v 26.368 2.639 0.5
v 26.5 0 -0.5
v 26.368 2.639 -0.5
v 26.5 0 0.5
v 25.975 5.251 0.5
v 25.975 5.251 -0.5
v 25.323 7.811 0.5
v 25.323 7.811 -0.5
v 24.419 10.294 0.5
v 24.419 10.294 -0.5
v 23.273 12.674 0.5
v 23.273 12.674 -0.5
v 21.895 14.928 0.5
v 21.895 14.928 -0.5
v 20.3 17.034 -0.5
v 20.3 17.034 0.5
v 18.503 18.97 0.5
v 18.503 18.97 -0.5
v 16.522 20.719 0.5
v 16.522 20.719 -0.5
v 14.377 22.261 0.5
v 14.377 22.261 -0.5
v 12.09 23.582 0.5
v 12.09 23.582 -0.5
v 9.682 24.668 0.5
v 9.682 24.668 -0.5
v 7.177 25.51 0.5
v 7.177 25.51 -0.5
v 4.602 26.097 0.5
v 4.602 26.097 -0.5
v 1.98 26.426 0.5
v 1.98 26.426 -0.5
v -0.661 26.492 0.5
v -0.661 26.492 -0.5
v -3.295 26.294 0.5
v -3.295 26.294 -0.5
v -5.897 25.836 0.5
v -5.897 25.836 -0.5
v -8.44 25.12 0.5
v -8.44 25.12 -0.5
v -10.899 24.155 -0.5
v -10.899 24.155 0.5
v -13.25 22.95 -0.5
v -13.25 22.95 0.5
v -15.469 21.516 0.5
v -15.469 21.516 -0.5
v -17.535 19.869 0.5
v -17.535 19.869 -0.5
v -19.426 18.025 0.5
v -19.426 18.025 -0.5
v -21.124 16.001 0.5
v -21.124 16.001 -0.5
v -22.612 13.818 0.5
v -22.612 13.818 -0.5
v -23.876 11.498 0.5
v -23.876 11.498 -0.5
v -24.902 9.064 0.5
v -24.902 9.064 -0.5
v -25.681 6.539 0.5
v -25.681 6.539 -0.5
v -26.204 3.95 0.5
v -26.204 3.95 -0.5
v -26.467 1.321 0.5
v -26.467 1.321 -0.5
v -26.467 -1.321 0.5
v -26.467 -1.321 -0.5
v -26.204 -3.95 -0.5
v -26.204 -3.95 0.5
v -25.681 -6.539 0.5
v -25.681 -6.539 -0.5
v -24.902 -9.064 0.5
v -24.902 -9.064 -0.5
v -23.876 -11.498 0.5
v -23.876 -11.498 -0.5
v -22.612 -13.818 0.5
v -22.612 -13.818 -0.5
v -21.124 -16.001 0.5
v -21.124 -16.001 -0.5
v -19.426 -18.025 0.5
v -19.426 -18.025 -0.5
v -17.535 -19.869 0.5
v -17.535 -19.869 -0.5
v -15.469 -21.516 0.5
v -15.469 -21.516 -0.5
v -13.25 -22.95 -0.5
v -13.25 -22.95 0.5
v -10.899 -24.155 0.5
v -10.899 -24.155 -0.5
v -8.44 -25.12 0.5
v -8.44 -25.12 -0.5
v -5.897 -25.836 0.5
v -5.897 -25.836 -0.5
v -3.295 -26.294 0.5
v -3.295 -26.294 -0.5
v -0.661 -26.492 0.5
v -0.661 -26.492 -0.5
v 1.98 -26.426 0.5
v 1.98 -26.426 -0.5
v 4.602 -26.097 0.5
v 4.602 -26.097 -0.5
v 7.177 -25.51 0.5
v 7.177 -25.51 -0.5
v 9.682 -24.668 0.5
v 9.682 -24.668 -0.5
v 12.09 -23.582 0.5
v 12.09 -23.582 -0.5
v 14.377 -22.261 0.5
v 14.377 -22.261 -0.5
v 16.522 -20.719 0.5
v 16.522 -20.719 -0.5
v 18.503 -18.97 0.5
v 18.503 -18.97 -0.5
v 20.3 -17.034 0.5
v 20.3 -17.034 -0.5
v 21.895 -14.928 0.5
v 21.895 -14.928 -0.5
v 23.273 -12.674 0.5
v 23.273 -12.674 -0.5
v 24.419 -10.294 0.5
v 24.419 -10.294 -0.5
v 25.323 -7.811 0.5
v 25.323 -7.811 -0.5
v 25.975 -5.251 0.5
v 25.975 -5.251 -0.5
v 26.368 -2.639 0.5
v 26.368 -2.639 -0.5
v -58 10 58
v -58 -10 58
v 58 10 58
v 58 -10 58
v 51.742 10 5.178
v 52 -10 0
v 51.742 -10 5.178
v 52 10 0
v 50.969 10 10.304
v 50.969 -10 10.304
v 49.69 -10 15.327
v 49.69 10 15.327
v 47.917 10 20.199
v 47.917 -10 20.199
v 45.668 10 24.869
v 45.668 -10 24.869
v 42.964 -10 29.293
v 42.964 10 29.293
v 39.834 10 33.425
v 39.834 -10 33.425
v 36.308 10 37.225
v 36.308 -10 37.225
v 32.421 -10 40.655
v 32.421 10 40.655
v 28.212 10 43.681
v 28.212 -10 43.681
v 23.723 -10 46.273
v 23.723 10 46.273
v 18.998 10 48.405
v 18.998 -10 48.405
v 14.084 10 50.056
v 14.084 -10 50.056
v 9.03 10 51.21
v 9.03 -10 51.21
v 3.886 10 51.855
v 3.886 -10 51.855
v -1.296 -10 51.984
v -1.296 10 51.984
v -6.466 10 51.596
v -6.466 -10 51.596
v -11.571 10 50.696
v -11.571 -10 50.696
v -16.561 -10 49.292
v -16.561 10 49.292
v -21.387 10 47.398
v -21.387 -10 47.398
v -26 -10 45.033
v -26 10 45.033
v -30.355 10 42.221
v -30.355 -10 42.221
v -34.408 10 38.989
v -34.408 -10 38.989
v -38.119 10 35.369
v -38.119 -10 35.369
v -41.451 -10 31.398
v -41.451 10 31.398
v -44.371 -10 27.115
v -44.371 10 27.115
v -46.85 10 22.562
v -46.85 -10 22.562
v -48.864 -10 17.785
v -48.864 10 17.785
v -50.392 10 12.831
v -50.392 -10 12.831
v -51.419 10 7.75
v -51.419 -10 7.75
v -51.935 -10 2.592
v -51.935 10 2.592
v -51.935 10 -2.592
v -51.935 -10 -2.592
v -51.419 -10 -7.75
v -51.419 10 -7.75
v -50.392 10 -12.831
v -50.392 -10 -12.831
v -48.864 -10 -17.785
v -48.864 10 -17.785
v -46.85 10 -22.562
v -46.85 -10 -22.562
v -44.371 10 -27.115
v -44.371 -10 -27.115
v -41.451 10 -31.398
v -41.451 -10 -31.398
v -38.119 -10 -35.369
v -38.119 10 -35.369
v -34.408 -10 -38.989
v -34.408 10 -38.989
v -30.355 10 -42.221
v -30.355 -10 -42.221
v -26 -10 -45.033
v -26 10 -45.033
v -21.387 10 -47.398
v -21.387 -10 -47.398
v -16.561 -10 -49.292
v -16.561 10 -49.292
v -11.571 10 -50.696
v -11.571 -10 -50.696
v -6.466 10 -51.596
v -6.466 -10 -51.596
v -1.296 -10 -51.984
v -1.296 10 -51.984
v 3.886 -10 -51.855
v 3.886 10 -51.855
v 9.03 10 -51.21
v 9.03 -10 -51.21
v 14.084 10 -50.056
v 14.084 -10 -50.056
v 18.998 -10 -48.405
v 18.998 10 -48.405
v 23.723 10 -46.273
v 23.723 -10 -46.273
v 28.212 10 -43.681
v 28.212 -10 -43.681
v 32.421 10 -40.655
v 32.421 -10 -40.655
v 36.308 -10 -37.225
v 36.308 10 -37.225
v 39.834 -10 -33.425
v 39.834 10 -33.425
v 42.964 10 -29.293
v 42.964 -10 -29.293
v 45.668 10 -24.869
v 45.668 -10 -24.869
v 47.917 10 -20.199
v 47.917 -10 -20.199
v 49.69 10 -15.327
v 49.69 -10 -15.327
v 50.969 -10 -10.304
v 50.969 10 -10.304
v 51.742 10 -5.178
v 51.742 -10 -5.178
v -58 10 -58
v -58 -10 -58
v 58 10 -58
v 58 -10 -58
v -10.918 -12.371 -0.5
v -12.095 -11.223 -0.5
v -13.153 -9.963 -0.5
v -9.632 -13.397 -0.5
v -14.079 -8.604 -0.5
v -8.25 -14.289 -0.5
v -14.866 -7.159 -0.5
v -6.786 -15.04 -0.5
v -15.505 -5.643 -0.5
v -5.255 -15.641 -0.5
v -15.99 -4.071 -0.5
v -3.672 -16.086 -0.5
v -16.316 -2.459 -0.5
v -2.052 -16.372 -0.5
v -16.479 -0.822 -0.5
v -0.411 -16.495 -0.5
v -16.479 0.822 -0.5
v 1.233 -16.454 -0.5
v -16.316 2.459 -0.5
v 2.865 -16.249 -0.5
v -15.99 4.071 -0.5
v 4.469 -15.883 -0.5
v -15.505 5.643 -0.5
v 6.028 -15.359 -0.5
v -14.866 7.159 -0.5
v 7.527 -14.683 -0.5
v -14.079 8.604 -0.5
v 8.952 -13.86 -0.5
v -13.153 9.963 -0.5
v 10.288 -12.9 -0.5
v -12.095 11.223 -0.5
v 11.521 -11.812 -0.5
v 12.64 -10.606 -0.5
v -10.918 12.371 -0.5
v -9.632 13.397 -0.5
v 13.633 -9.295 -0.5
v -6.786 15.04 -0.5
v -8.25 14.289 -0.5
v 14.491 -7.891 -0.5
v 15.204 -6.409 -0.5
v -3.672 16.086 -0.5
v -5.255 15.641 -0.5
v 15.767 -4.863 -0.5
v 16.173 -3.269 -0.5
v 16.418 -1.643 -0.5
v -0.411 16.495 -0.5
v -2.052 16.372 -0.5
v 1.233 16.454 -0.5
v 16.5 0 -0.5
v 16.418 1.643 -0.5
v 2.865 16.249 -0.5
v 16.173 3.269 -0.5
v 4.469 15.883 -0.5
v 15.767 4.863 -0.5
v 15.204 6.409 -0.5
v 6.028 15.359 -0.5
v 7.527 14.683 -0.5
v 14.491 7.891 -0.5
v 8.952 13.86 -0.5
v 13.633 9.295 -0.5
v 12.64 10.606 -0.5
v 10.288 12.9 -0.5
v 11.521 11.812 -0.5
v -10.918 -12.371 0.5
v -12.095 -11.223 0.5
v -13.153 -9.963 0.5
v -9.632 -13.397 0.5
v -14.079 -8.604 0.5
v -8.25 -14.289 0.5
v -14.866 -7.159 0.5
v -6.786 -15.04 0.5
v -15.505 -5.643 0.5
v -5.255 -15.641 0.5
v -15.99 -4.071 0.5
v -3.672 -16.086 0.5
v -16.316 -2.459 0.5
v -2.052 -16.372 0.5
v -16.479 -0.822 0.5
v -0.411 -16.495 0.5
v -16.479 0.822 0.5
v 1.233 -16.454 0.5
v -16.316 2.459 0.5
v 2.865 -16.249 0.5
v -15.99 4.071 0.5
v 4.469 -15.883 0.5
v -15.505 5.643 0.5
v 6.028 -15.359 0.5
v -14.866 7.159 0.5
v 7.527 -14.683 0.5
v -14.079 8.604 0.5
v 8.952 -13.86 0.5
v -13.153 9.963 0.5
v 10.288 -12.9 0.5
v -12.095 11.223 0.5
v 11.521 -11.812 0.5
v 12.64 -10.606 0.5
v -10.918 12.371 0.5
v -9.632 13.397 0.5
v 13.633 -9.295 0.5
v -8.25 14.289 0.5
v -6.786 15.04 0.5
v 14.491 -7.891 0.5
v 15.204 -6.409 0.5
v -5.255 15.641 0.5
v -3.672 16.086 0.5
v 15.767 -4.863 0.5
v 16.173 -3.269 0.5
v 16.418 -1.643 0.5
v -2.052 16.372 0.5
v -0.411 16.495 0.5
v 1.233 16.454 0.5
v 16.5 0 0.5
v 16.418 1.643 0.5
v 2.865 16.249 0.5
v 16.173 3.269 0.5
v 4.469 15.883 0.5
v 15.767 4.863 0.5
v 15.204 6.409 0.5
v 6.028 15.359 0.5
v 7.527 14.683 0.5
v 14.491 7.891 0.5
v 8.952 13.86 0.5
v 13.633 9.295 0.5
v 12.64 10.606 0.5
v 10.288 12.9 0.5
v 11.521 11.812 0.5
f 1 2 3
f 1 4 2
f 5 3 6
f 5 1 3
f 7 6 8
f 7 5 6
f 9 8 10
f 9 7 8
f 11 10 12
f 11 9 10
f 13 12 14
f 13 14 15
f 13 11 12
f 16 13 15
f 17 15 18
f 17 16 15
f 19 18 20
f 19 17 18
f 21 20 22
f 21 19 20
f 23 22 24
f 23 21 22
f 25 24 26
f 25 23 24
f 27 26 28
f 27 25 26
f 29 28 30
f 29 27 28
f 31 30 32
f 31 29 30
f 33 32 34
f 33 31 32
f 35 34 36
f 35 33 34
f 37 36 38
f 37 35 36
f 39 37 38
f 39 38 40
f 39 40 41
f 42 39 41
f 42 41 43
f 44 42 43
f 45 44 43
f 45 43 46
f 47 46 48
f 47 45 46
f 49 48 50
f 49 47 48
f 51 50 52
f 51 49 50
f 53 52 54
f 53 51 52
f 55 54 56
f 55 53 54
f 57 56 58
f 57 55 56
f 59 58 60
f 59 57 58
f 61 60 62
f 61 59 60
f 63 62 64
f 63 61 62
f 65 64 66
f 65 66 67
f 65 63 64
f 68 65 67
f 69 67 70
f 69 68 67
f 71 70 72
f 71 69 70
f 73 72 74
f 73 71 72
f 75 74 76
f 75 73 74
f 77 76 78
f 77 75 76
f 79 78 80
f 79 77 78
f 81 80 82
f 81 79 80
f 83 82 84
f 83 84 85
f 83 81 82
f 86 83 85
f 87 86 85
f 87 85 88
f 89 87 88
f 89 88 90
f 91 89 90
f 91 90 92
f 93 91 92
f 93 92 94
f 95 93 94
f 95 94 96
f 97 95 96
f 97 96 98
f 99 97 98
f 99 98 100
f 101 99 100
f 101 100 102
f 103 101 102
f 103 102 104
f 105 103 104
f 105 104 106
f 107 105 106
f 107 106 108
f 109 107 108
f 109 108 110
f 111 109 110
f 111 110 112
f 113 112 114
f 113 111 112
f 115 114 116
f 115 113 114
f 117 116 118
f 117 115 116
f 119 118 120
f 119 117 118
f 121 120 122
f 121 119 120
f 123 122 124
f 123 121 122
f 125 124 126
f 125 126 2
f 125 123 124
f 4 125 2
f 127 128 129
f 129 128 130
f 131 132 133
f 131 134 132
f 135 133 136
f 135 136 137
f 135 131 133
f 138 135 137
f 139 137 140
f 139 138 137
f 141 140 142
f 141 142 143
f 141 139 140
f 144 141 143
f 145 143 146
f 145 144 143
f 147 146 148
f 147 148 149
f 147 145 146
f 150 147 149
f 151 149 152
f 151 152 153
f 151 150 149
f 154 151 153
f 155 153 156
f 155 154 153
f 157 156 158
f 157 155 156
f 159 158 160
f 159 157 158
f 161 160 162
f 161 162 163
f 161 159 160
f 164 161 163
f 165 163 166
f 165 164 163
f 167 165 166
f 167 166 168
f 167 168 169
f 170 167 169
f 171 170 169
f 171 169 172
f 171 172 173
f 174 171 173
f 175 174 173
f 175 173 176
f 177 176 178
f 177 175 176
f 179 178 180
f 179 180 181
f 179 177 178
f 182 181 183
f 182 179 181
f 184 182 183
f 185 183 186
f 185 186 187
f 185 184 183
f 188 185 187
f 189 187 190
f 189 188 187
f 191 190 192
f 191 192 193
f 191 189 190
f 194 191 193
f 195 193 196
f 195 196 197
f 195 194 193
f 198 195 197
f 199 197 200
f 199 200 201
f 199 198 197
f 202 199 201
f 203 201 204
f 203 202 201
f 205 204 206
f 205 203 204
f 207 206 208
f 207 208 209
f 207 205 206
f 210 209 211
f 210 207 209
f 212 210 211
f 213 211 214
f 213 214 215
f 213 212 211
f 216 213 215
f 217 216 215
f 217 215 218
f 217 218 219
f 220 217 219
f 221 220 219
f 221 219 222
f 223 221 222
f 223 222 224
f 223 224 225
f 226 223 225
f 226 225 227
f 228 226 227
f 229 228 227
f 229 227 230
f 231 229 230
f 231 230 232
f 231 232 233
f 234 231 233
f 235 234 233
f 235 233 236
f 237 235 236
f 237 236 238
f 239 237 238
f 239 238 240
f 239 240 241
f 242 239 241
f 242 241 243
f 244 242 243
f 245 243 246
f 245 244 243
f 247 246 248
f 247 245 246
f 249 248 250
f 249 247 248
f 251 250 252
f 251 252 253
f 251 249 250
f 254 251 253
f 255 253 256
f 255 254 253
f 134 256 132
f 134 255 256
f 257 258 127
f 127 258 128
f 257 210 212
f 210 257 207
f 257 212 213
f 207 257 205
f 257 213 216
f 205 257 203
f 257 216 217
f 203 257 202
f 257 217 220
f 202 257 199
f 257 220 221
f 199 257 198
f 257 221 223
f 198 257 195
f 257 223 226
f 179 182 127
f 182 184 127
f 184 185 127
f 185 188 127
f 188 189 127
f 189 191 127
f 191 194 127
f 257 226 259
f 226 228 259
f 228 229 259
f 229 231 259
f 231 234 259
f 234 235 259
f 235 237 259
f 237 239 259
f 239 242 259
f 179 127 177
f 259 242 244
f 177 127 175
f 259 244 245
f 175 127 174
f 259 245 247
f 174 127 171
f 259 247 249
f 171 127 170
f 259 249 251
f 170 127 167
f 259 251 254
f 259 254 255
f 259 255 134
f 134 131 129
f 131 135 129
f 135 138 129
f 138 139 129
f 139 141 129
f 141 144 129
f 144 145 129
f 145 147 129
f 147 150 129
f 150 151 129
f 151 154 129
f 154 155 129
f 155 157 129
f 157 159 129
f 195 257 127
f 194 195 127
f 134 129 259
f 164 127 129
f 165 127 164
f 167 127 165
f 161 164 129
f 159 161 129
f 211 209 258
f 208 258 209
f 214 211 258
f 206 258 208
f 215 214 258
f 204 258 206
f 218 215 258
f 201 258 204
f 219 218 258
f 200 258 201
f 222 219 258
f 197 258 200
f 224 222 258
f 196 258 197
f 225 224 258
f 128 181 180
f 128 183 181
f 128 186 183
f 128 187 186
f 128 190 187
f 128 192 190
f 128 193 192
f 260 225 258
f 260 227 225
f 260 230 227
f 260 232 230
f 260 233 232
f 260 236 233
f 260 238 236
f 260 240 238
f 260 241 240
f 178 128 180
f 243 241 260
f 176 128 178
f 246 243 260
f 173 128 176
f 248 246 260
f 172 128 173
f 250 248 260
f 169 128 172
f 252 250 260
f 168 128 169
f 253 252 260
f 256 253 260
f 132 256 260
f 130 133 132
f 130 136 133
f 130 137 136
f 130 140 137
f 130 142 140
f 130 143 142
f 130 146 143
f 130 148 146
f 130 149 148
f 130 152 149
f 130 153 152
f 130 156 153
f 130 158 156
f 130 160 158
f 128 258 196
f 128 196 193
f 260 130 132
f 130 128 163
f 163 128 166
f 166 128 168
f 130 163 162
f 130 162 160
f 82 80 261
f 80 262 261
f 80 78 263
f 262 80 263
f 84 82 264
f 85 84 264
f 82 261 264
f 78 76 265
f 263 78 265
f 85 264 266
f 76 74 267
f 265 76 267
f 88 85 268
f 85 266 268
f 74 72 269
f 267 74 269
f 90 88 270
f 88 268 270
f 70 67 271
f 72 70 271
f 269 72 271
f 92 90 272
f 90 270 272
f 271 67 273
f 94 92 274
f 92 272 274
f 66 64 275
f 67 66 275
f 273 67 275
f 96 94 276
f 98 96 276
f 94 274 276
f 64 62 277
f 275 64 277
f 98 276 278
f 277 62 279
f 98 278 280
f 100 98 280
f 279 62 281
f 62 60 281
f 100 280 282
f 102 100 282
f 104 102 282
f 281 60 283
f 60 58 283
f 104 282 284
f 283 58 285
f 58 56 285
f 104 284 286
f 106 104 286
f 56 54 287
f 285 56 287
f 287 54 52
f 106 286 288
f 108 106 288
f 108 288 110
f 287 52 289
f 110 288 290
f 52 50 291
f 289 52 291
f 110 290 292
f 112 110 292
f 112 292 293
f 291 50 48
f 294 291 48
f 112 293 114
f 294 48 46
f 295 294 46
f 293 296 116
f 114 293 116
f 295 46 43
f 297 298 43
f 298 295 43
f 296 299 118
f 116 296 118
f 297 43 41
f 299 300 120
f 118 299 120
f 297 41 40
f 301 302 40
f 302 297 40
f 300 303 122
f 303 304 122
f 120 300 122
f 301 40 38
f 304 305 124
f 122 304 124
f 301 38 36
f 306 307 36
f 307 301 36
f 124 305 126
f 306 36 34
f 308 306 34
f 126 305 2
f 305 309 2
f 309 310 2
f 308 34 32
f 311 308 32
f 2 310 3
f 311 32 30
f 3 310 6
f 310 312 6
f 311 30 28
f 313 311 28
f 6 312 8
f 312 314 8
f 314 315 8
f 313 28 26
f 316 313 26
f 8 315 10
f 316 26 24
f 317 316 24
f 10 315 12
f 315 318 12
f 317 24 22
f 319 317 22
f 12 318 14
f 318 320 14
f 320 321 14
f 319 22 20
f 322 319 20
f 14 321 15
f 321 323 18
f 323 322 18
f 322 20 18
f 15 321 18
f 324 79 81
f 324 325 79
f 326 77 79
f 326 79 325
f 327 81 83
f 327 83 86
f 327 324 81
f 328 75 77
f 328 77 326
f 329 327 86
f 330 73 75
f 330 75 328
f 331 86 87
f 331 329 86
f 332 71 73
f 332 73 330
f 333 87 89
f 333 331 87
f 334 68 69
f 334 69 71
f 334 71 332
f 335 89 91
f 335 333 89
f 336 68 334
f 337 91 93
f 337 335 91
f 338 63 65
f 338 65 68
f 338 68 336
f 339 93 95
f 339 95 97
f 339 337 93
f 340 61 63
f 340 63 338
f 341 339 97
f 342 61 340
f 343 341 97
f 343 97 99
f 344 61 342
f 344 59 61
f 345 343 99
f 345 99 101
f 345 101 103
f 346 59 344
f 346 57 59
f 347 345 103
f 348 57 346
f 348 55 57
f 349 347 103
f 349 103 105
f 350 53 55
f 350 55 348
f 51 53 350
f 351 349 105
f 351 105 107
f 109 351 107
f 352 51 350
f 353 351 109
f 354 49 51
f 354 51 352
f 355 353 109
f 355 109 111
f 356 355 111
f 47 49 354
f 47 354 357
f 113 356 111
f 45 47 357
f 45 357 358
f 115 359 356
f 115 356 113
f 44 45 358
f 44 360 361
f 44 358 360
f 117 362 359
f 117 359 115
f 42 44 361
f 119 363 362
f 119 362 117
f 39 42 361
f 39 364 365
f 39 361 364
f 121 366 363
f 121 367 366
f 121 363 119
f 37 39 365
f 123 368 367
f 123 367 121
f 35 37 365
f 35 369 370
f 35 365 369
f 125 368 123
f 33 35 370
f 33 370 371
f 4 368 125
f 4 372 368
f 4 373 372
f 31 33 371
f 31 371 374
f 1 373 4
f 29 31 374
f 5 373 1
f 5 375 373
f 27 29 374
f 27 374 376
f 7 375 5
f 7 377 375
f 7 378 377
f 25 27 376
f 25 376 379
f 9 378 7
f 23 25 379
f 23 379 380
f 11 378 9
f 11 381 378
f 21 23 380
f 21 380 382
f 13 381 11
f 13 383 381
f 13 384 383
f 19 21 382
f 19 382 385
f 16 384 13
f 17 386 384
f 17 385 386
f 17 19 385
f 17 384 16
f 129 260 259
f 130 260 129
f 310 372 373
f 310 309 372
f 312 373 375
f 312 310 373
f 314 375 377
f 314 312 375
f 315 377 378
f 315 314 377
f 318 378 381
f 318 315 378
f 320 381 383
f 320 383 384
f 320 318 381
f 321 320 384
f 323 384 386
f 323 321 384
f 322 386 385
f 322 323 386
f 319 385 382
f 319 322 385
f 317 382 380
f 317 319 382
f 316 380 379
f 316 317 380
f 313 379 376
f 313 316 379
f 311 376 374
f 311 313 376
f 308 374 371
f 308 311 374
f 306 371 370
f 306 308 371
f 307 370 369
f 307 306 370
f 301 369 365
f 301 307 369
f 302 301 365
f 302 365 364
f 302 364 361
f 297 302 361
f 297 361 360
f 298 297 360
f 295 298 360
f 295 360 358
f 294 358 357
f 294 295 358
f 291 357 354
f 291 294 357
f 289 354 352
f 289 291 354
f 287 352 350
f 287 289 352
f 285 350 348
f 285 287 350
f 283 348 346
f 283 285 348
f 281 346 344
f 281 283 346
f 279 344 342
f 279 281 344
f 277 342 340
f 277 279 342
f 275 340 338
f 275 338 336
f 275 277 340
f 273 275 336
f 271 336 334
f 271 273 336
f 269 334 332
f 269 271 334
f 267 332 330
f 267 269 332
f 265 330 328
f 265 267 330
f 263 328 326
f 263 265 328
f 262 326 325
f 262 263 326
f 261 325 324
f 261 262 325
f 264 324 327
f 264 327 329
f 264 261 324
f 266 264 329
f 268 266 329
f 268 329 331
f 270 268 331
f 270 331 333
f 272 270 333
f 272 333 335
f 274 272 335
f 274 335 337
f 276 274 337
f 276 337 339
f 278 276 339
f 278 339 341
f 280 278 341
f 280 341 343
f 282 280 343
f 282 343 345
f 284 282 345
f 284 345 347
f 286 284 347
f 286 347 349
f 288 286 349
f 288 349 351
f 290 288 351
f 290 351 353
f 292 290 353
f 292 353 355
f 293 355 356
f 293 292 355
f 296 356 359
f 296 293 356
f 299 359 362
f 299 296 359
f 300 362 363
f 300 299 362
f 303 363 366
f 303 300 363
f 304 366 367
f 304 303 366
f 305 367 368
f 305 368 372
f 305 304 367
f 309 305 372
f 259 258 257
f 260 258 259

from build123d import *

# Parameters (mm, degrees)
F0_W     = 116
F0_H     = 116
F0_R     = 52
F1_DEPTH = 10
F2_R     = 26.5
F2_R_2   = 16.5
F3_DEPTH = 0.5


with BuildPart() as f1:
    # F0 (on Front) → F1 (new body, symmetric)
    with BuildSketch(Plane.XZ):
        Rectangle(F0_W, F0_H)
        Circle(F0_R, mode=Mode.SUBTRACT)
    extrude(amount=F1_DEPTH, both=True)


with BuildPart() as f3:
    # F2 (on Top) → F3 (new body, symmetric)
    with BuildSketch(Plane.XY):
        Circle(F2_R)
        Circle(F2_R_2, mode=Mode.SUBTRACT)
    extrude(amount=F3_DEPTH, both=True)


solid = Compound([f1.part, f3.part])
